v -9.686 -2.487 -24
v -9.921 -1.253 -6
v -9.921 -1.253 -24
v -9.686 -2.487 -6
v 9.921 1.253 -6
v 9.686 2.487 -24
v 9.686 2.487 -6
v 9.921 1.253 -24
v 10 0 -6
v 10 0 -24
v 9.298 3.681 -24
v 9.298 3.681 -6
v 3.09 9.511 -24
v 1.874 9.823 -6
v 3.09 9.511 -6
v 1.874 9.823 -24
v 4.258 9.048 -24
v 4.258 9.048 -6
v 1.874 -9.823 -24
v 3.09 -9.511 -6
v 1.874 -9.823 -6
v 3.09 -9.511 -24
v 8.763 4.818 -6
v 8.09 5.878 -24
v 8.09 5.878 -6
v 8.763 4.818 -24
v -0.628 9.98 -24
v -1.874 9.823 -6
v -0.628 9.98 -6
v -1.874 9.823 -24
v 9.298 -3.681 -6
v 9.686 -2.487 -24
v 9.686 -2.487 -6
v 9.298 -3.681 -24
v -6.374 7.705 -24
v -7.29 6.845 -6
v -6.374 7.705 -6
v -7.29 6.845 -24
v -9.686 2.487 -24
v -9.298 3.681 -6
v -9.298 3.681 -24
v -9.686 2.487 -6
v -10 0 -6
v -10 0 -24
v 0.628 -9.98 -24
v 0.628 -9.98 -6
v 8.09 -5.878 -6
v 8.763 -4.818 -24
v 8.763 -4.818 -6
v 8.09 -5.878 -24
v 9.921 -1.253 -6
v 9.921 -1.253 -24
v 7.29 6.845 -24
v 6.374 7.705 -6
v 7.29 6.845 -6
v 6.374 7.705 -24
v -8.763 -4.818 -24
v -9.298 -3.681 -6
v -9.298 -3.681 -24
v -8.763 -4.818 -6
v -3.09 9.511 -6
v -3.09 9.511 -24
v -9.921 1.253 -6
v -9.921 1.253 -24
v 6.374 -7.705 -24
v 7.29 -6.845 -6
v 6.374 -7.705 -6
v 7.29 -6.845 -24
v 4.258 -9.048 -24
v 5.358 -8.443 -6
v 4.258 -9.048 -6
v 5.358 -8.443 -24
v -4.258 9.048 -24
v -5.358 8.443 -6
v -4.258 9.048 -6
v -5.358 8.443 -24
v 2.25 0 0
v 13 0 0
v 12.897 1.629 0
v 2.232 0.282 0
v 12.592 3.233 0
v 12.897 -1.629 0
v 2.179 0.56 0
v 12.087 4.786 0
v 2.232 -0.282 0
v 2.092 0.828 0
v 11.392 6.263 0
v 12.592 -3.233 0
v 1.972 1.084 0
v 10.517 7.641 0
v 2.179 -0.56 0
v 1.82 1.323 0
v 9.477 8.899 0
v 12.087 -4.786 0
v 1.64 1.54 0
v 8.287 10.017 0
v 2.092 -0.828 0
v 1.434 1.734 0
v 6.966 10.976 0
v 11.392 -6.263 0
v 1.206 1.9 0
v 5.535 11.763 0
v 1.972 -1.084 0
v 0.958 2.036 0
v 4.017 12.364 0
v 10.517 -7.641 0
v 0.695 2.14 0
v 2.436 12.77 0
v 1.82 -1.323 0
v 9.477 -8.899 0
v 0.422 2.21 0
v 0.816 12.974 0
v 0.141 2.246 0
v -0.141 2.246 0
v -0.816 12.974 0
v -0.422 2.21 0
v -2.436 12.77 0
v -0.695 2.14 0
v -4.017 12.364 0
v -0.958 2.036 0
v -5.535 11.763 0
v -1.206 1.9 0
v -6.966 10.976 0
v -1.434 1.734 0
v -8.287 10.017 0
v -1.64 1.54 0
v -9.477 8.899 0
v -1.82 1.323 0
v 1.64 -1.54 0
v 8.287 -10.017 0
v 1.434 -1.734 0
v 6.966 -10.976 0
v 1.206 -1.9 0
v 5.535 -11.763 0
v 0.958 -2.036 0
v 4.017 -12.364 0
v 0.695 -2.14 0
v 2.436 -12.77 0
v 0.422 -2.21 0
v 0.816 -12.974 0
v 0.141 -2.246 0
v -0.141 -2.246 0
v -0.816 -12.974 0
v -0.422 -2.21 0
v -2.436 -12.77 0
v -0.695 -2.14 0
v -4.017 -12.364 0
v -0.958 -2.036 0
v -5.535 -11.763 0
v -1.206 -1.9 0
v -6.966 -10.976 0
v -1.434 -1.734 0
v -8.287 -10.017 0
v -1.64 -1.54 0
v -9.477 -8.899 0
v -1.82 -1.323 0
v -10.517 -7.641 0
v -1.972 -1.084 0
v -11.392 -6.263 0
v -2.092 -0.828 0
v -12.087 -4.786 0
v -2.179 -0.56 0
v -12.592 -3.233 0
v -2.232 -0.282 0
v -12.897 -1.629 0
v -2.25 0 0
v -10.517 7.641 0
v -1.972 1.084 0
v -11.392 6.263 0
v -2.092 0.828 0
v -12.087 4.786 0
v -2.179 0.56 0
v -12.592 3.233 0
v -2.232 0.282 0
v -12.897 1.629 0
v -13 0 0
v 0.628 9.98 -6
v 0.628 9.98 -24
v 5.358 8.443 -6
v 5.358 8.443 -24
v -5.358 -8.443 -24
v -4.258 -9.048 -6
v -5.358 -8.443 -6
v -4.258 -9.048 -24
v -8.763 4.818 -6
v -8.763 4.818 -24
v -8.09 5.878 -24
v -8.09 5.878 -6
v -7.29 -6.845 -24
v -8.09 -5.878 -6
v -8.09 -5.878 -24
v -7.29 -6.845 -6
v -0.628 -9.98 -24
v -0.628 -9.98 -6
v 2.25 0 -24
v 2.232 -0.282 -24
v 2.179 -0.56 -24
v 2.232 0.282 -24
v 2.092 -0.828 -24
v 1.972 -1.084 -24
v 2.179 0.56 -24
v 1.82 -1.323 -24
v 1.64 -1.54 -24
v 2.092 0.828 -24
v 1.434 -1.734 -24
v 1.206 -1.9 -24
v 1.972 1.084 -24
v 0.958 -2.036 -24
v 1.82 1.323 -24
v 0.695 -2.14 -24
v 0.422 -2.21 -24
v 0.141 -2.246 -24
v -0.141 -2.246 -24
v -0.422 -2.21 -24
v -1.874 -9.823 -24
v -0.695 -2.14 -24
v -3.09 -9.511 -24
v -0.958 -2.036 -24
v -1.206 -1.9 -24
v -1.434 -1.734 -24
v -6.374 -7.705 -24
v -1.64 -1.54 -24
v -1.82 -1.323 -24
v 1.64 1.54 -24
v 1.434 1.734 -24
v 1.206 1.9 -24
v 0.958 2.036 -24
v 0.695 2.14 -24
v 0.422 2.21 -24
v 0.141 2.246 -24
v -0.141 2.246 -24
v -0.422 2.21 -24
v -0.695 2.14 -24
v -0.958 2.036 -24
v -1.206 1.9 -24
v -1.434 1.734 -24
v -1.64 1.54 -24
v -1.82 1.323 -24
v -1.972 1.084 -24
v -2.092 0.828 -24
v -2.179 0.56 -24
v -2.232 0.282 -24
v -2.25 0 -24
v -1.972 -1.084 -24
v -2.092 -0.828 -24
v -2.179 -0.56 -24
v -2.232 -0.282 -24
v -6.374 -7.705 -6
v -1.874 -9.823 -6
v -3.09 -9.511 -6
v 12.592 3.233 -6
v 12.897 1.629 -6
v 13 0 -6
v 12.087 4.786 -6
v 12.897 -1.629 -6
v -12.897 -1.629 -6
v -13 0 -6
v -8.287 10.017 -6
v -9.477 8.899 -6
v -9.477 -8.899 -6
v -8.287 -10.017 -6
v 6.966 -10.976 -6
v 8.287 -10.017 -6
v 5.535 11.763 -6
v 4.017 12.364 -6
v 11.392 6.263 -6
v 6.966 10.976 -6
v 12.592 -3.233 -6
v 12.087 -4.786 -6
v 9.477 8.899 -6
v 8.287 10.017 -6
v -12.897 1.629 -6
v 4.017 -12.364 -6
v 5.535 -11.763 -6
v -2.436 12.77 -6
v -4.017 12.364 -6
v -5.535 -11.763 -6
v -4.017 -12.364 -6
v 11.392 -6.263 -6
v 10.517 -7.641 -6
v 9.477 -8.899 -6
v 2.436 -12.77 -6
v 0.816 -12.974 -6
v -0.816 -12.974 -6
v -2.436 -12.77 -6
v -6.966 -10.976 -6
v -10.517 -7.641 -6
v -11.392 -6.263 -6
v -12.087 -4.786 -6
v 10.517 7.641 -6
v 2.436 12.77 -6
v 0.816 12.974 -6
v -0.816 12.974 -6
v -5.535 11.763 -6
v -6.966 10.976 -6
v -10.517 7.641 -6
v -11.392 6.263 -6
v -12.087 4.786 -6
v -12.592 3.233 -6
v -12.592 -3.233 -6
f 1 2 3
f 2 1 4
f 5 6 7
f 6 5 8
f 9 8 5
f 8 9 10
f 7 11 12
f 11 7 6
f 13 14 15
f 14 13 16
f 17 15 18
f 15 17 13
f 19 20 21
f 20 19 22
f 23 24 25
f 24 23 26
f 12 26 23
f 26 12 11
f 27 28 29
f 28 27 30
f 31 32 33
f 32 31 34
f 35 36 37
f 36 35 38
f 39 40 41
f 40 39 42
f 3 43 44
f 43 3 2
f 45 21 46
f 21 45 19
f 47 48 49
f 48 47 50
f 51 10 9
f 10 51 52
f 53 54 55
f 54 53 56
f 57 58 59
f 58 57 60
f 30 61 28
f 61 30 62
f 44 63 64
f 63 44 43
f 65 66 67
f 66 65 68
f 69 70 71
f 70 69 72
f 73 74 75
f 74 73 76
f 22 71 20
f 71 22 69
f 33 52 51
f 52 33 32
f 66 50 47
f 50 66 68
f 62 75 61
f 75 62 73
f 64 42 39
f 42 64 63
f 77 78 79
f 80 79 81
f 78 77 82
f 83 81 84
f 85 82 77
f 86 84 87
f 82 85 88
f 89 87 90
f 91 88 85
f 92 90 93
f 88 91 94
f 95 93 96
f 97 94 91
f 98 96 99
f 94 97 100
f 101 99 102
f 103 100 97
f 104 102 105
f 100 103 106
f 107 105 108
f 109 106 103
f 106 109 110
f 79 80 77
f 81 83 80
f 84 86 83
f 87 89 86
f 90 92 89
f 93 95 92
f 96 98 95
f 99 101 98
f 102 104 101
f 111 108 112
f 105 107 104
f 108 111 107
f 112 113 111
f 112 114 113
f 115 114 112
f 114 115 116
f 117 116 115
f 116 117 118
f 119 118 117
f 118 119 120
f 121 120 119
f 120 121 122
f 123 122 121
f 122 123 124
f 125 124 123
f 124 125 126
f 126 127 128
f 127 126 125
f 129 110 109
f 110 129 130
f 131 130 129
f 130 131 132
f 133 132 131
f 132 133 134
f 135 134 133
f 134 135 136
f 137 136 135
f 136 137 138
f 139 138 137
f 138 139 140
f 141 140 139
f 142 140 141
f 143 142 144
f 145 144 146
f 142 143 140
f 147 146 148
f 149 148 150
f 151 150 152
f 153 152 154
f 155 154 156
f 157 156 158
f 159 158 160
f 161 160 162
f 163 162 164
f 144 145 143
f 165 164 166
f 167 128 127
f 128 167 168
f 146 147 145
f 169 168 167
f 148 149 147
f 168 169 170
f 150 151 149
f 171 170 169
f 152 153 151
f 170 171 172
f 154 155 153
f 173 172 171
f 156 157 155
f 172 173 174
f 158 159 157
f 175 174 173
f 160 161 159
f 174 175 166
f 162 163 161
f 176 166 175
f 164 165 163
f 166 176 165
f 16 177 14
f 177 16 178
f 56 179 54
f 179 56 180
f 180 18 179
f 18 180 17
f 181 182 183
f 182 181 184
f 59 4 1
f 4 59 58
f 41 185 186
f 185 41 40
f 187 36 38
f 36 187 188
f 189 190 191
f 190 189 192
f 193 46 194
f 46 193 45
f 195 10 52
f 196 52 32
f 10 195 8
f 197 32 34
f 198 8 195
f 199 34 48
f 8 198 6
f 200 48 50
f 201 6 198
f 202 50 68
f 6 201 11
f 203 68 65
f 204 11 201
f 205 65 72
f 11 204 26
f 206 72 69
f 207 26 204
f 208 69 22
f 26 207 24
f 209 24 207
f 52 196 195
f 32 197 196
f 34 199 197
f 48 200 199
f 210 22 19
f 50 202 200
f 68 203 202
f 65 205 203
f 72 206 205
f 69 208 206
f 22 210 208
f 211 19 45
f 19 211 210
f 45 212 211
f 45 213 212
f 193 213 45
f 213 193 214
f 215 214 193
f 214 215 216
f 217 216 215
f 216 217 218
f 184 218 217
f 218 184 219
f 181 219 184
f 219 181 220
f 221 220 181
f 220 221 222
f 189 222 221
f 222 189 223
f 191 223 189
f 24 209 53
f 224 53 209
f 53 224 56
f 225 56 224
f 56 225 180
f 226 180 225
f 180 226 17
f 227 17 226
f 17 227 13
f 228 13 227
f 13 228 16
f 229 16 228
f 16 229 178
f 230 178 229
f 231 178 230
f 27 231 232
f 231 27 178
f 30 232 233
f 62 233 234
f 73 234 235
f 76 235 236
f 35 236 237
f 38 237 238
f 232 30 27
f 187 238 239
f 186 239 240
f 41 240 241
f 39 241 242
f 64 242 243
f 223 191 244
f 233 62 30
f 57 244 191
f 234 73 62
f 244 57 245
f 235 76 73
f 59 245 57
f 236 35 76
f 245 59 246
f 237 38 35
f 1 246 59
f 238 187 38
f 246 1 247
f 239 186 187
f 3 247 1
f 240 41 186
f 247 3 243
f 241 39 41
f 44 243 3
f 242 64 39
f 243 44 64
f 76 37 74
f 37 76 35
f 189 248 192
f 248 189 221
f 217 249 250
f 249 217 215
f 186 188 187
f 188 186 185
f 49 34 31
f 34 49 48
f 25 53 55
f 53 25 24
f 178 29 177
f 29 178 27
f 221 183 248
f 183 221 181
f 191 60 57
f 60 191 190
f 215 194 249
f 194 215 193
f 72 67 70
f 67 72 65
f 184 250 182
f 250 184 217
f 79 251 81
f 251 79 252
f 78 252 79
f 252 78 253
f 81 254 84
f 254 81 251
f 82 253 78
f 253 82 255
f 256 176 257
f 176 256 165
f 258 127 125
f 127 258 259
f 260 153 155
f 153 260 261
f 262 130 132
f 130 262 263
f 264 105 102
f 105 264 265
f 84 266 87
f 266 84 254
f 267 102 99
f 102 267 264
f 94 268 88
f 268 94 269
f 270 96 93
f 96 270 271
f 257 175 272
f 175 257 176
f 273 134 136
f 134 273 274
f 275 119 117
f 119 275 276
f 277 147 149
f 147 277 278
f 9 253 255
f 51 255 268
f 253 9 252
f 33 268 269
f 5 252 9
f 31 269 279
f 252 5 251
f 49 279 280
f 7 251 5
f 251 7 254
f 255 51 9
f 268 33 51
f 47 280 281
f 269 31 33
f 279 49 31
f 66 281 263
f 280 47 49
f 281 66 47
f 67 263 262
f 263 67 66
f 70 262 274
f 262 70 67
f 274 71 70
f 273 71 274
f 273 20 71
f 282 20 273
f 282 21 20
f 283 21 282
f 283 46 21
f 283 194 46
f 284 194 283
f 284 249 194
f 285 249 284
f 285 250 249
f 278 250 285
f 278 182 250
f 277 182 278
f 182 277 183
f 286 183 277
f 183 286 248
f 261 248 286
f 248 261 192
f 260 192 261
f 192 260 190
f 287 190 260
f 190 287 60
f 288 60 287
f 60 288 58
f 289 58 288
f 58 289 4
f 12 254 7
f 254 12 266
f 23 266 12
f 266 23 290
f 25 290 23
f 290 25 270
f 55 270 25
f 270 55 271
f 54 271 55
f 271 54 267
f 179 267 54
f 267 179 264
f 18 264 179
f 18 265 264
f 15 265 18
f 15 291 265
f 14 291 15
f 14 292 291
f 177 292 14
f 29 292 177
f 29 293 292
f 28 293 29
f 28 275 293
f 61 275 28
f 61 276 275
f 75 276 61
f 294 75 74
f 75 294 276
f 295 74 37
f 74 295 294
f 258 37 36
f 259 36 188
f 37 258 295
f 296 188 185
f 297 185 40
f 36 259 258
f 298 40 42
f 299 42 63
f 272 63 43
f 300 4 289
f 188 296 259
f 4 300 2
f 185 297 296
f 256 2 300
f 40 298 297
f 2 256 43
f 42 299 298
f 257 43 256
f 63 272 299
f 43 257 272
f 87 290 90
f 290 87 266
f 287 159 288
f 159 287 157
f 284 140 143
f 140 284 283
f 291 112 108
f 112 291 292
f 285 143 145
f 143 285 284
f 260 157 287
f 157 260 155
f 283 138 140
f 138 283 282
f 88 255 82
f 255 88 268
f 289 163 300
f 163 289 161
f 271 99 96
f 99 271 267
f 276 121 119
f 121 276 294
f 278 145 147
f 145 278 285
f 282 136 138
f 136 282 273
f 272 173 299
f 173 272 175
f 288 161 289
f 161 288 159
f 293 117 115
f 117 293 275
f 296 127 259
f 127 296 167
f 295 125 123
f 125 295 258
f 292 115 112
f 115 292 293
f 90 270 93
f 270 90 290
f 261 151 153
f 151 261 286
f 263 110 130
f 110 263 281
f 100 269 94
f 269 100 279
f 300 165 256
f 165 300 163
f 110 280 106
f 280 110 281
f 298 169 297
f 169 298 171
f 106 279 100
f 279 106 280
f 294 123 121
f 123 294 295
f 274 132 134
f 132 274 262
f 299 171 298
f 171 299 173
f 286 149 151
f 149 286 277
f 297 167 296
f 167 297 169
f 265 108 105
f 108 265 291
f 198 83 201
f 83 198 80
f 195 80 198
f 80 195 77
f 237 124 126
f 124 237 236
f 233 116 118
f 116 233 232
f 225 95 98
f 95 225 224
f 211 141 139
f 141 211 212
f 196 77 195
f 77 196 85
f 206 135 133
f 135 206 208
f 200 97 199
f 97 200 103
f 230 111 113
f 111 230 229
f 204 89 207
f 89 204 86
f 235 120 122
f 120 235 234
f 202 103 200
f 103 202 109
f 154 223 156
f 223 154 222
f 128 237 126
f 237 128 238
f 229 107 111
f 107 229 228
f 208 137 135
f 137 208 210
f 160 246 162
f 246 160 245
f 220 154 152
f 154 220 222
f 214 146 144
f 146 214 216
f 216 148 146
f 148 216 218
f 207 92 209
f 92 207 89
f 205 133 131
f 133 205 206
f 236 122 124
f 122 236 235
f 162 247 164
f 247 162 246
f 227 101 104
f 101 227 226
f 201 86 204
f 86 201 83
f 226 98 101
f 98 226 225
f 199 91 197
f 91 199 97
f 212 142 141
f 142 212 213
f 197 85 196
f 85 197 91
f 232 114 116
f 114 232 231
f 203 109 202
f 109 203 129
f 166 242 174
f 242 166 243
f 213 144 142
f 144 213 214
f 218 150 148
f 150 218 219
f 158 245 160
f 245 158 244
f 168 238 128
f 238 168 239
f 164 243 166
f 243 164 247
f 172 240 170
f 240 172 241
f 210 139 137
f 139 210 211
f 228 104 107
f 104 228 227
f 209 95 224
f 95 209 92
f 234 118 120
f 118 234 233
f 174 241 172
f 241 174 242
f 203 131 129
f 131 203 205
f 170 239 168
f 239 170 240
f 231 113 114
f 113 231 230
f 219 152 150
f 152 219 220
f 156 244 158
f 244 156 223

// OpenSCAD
$fn = 50;


difference() {
	union() {
		translate(v = [0, 0, -24.0000000000]) {
			cylinder(h = 24, r = 10.0000000000);
		}
		translate(v = [0, 0, -6.0000000000]) {
			cylinder(h = 6, r = 13.0000000000);
		}
	}
	union() {
		#translate(v = [0, 0, -24]) {
			cylinder(h = 24, r = 2.2500000000);
		}
	}
}
